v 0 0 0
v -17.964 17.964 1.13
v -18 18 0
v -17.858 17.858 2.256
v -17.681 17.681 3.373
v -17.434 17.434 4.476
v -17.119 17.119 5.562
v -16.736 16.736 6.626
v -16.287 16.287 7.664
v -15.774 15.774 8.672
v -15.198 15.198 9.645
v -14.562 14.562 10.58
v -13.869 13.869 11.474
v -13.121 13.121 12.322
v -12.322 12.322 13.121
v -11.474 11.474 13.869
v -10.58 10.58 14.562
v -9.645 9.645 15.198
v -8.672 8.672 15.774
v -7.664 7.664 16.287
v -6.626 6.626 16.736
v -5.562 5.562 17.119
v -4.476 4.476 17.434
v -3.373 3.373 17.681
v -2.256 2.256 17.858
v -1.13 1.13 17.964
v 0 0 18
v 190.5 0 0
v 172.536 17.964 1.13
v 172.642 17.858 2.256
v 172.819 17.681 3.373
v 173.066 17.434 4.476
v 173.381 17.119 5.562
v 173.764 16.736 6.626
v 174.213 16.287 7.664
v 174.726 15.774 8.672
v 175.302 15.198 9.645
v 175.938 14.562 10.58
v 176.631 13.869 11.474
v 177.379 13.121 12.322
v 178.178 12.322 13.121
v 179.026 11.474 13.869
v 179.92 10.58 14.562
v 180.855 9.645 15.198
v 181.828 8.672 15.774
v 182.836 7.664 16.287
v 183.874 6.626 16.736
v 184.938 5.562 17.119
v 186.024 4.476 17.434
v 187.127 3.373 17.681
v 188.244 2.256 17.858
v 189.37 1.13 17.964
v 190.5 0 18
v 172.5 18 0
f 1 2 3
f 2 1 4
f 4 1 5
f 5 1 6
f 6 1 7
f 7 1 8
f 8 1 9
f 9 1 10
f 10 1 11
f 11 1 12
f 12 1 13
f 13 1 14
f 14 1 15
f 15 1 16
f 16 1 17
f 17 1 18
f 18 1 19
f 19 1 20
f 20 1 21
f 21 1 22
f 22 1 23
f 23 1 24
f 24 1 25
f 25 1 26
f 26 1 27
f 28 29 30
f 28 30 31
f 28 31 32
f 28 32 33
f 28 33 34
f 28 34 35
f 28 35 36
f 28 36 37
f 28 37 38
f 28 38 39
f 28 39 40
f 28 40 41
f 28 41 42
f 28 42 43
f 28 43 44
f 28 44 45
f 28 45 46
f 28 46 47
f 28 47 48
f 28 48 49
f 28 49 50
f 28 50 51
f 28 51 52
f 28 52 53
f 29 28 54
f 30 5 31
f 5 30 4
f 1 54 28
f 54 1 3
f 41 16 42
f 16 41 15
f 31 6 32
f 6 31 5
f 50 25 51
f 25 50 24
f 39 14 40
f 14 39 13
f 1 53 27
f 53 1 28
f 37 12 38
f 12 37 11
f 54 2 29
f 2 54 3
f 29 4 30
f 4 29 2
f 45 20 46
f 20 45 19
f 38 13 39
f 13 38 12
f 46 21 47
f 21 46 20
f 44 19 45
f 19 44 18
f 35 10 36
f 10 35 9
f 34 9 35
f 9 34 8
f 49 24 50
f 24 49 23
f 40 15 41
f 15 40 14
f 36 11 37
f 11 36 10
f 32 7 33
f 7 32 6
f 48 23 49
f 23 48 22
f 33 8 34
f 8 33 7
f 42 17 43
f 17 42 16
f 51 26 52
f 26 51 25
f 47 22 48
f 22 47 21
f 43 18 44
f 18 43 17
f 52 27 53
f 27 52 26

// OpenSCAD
// Straight Quarter Round Molding Model in OpenSCAD with Automatic End Cuts
// Author: Andrewhvolk
// Description: Creates a quarter round molding with configurable end angles
// Last Updated: March 17, 2025

// Parameters
radius = 18;       // Radius of quarter round (mm), 3/4 inch radius
wallsidelength = 190.5;  // Length of wall side (mm), remains constant regardless of cuts
left_end = "inner";   // Left end angle: "square", "inner", or "outer"
right_end = "outer";  // Right end angle: "90", inner"45", or outer="135"
$fn = 100;         // Number of fragments for circle approximation


// Base quarter round profile
module quarter_round(radius, length) {
    // Create a quarter round profile and extrude it along the X-axis
    rotate([90, 0, 90])
    translate([0, 0, -radius])
        linear_extrude(length)
            intersection() {
                square([radius, radius]);
                circle(r=radius);
            }
}

// Function to create right end cut (at beginning of quarter round)
module right_end_cut(angle, radius) {
    if (angle == "square") {
        // 90 degree cut (square)
        translate([-50, -25, -25])
        cube([50, 50, 50]);
    } else if (angle == "inner") {
        // 45 degree cut (miter) - Acute angle
        translate([-50, -50, -50])
        rotate([0, 0, 45])
        cube([100, 100, 100]);
    } else if (angle == "outer") {
        // 135 degree cut (reverse miter) - Obtuse angle
        translate([-50*sqrt(2), 0, -1])
        rotate([0, 0, -45])
        cube([50, 50, 50]);
    }
}

// Function to create left end cut (at end of quarter round)
module left_end_cut(angle, radius, wallsidelength) {
    if (angle == "square") {
        // 90 degree cut (square)
        translate([wallsidelength, -25, -1])
        cube([50, 50, 50]);
    } else if (angle == "inner") {
        // 45 degree cut (miter) - Acute angle
        translate([wallsidelength-radius, radius, -1])
        rotate([0, 0, -45])
        cube([50, 50, 50]);
    } else if (angle == "outer") {
        // 135 degree cut (reverse miter) - Obtuse angle
        translate([wallsidelength, 0, -1])
        rotate([0, 0, -45])
        cube([50, 50, 50]);
    }
}

// Main module to generate the quarter round with cuts
module quarter_round_with_cuts(radius, wallsidelength, left_end, right_end) {
    difference() {
        // Create a quarter round that's always long enough
        quarter_round(radius, wallsidelength + 2*radius);
        
        union() {
            // Right end cut (at beginning of the quarter round)
            right_end_cut(right_end, radius);
            
            // Left end cut (at end of the quarter round)
            left_end_cut(left_end, radius, wallsidelength);
        }
    }
}

// Visual verification - Wall side measurement line
module wall_measurement_line(wallsidelength) {
    color("red")
    translate([0, -5, 0])
    rotate([90, 0, 0])
    linear_extrude(1)
    square([wallsidelength, 1]);
}

// Generate the final model
quarter_round_with_cuts(radius, wallsidelength, left_end, right_end);
//wall_measurement_line(wallsidelength);
